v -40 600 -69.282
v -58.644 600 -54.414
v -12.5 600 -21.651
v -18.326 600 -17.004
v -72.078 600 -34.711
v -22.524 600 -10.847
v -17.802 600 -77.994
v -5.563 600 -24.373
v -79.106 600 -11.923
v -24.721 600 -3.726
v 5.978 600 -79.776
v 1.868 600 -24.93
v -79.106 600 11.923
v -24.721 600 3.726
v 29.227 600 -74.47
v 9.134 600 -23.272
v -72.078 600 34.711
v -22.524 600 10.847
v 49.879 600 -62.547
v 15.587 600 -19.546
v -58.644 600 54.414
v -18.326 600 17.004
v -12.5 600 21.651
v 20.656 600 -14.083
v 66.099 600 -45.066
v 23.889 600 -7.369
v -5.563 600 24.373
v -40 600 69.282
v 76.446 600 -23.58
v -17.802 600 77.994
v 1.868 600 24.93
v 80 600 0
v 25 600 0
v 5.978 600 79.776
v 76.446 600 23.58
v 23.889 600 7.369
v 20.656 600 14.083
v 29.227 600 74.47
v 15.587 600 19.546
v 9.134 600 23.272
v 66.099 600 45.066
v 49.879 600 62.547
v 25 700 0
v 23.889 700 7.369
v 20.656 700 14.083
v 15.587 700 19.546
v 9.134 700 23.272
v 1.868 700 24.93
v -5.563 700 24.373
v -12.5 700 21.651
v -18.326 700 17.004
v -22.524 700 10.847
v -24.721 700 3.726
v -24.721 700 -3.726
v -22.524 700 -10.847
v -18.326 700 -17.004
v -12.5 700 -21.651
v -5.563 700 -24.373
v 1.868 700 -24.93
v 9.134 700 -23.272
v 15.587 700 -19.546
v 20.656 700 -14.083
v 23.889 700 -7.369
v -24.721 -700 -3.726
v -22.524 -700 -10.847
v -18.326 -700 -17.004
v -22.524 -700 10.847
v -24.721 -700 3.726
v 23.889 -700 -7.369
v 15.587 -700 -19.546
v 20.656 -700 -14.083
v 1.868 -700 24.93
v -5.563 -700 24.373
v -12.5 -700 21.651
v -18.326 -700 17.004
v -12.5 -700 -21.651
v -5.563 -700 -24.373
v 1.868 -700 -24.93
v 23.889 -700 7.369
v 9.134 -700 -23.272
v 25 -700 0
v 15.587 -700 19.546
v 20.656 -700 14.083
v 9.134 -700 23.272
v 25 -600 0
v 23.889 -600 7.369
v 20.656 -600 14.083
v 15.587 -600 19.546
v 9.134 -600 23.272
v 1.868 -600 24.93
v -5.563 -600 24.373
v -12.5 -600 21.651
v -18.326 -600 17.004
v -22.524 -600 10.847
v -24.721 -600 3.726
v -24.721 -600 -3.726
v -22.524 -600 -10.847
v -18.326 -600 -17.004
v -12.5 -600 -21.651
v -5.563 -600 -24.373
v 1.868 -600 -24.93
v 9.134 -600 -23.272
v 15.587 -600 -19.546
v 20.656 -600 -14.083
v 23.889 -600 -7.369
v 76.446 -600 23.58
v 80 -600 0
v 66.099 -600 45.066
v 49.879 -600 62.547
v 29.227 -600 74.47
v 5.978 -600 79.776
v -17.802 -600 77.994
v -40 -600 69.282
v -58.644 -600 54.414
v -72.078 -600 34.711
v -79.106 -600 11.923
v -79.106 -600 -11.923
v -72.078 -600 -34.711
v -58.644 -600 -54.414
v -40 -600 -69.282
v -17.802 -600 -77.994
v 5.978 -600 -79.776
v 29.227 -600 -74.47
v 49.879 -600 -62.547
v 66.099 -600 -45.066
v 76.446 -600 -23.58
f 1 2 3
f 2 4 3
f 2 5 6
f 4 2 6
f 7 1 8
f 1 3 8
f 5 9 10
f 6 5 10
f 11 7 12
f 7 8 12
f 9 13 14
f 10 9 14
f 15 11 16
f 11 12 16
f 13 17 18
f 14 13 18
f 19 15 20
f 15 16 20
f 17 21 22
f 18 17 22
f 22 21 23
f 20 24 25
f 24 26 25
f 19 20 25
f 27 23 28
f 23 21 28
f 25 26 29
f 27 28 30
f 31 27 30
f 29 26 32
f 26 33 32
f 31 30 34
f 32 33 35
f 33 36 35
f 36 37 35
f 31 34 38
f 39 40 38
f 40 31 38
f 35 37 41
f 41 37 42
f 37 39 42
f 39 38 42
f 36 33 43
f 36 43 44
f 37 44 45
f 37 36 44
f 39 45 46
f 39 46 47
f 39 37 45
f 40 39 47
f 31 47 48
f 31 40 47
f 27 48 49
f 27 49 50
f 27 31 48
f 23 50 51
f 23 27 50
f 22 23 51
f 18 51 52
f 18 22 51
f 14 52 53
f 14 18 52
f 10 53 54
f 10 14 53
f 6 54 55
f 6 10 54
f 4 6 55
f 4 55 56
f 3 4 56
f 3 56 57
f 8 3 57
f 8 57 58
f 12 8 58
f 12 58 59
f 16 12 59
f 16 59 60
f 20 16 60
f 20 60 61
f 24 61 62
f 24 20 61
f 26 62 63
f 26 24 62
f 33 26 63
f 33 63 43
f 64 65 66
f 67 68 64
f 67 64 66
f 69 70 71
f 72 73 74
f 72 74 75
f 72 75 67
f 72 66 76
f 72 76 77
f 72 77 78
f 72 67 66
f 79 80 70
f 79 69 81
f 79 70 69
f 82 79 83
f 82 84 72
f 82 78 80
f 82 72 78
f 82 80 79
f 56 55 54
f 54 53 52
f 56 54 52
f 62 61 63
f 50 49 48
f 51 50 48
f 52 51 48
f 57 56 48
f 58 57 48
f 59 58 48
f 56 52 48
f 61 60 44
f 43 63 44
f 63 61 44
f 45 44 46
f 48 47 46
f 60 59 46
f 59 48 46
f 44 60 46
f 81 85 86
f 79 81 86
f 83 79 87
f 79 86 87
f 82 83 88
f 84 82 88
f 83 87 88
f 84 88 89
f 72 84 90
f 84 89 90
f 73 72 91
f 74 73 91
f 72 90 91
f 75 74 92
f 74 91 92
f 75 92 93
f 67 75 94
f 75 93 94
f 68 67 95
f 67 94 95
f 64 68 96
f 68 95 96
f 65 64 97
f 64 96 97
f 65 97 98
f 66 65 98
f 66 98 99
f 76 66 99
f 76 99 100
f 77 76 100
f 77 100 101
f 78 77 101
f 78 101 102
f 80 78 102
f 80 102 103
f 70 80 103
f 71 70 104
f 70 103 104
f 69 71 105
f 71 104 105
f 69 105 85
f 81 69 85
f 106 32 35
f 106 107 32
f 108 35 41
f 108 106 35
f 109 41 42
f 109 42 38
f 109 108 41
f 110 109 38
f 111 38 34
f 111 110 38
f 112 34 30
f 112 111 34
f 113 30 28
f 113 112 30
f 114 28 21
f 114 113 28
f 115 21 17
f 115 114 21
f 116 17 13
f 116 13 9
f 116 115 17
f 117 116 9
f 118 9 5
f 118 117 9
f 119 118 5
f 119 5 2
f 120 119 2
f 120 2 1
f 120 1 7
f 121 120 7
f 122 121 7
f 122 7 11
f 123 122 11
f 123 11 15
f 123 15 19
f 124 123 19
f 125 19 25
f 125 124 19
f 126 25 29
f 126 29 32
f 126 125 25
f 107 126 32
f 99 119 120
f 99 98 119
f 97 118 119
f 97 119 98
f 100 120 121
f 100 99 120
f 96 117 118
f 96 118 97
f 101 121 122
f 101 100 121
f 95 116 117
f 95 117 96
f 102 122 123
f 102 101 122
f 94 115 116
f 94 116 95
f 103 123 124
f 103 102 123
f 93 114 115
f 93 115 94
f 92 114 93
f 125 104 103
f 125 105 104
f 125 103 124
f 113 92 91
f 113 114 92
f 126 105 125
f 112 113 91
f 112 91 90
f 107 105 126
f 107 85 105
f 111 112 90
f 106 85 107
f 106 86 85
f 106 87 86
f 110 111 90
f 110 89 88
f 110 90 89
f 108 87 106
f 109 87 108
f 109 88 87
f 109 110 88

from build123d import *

# Parameters (mm, degrees)
F0_R     = 80
F1_DEPTH = 600
F2_R     = 25
F3_DEPTH = 100


with BuildPart() as f1:
    # F0 (on Front) → F1 (new body, symmetric)
    with BuildSketch(Plane.XZ):
        Circle(F0_R)
    extrude(amount=F1_DEPTH, both=True)

    # F2 (on face) → F3 (join)
    with BuildSketch(Plane.XZ.offset(600)):
        Circle(F2_R)
    extrude(amount=F3_DEPTH)

    # F4: F1 across plane


with BuildPart() as f1_1:
    add(f1.part)
    add(f1.part.mirror(Plane.XZ))


solid = f1_1.part
